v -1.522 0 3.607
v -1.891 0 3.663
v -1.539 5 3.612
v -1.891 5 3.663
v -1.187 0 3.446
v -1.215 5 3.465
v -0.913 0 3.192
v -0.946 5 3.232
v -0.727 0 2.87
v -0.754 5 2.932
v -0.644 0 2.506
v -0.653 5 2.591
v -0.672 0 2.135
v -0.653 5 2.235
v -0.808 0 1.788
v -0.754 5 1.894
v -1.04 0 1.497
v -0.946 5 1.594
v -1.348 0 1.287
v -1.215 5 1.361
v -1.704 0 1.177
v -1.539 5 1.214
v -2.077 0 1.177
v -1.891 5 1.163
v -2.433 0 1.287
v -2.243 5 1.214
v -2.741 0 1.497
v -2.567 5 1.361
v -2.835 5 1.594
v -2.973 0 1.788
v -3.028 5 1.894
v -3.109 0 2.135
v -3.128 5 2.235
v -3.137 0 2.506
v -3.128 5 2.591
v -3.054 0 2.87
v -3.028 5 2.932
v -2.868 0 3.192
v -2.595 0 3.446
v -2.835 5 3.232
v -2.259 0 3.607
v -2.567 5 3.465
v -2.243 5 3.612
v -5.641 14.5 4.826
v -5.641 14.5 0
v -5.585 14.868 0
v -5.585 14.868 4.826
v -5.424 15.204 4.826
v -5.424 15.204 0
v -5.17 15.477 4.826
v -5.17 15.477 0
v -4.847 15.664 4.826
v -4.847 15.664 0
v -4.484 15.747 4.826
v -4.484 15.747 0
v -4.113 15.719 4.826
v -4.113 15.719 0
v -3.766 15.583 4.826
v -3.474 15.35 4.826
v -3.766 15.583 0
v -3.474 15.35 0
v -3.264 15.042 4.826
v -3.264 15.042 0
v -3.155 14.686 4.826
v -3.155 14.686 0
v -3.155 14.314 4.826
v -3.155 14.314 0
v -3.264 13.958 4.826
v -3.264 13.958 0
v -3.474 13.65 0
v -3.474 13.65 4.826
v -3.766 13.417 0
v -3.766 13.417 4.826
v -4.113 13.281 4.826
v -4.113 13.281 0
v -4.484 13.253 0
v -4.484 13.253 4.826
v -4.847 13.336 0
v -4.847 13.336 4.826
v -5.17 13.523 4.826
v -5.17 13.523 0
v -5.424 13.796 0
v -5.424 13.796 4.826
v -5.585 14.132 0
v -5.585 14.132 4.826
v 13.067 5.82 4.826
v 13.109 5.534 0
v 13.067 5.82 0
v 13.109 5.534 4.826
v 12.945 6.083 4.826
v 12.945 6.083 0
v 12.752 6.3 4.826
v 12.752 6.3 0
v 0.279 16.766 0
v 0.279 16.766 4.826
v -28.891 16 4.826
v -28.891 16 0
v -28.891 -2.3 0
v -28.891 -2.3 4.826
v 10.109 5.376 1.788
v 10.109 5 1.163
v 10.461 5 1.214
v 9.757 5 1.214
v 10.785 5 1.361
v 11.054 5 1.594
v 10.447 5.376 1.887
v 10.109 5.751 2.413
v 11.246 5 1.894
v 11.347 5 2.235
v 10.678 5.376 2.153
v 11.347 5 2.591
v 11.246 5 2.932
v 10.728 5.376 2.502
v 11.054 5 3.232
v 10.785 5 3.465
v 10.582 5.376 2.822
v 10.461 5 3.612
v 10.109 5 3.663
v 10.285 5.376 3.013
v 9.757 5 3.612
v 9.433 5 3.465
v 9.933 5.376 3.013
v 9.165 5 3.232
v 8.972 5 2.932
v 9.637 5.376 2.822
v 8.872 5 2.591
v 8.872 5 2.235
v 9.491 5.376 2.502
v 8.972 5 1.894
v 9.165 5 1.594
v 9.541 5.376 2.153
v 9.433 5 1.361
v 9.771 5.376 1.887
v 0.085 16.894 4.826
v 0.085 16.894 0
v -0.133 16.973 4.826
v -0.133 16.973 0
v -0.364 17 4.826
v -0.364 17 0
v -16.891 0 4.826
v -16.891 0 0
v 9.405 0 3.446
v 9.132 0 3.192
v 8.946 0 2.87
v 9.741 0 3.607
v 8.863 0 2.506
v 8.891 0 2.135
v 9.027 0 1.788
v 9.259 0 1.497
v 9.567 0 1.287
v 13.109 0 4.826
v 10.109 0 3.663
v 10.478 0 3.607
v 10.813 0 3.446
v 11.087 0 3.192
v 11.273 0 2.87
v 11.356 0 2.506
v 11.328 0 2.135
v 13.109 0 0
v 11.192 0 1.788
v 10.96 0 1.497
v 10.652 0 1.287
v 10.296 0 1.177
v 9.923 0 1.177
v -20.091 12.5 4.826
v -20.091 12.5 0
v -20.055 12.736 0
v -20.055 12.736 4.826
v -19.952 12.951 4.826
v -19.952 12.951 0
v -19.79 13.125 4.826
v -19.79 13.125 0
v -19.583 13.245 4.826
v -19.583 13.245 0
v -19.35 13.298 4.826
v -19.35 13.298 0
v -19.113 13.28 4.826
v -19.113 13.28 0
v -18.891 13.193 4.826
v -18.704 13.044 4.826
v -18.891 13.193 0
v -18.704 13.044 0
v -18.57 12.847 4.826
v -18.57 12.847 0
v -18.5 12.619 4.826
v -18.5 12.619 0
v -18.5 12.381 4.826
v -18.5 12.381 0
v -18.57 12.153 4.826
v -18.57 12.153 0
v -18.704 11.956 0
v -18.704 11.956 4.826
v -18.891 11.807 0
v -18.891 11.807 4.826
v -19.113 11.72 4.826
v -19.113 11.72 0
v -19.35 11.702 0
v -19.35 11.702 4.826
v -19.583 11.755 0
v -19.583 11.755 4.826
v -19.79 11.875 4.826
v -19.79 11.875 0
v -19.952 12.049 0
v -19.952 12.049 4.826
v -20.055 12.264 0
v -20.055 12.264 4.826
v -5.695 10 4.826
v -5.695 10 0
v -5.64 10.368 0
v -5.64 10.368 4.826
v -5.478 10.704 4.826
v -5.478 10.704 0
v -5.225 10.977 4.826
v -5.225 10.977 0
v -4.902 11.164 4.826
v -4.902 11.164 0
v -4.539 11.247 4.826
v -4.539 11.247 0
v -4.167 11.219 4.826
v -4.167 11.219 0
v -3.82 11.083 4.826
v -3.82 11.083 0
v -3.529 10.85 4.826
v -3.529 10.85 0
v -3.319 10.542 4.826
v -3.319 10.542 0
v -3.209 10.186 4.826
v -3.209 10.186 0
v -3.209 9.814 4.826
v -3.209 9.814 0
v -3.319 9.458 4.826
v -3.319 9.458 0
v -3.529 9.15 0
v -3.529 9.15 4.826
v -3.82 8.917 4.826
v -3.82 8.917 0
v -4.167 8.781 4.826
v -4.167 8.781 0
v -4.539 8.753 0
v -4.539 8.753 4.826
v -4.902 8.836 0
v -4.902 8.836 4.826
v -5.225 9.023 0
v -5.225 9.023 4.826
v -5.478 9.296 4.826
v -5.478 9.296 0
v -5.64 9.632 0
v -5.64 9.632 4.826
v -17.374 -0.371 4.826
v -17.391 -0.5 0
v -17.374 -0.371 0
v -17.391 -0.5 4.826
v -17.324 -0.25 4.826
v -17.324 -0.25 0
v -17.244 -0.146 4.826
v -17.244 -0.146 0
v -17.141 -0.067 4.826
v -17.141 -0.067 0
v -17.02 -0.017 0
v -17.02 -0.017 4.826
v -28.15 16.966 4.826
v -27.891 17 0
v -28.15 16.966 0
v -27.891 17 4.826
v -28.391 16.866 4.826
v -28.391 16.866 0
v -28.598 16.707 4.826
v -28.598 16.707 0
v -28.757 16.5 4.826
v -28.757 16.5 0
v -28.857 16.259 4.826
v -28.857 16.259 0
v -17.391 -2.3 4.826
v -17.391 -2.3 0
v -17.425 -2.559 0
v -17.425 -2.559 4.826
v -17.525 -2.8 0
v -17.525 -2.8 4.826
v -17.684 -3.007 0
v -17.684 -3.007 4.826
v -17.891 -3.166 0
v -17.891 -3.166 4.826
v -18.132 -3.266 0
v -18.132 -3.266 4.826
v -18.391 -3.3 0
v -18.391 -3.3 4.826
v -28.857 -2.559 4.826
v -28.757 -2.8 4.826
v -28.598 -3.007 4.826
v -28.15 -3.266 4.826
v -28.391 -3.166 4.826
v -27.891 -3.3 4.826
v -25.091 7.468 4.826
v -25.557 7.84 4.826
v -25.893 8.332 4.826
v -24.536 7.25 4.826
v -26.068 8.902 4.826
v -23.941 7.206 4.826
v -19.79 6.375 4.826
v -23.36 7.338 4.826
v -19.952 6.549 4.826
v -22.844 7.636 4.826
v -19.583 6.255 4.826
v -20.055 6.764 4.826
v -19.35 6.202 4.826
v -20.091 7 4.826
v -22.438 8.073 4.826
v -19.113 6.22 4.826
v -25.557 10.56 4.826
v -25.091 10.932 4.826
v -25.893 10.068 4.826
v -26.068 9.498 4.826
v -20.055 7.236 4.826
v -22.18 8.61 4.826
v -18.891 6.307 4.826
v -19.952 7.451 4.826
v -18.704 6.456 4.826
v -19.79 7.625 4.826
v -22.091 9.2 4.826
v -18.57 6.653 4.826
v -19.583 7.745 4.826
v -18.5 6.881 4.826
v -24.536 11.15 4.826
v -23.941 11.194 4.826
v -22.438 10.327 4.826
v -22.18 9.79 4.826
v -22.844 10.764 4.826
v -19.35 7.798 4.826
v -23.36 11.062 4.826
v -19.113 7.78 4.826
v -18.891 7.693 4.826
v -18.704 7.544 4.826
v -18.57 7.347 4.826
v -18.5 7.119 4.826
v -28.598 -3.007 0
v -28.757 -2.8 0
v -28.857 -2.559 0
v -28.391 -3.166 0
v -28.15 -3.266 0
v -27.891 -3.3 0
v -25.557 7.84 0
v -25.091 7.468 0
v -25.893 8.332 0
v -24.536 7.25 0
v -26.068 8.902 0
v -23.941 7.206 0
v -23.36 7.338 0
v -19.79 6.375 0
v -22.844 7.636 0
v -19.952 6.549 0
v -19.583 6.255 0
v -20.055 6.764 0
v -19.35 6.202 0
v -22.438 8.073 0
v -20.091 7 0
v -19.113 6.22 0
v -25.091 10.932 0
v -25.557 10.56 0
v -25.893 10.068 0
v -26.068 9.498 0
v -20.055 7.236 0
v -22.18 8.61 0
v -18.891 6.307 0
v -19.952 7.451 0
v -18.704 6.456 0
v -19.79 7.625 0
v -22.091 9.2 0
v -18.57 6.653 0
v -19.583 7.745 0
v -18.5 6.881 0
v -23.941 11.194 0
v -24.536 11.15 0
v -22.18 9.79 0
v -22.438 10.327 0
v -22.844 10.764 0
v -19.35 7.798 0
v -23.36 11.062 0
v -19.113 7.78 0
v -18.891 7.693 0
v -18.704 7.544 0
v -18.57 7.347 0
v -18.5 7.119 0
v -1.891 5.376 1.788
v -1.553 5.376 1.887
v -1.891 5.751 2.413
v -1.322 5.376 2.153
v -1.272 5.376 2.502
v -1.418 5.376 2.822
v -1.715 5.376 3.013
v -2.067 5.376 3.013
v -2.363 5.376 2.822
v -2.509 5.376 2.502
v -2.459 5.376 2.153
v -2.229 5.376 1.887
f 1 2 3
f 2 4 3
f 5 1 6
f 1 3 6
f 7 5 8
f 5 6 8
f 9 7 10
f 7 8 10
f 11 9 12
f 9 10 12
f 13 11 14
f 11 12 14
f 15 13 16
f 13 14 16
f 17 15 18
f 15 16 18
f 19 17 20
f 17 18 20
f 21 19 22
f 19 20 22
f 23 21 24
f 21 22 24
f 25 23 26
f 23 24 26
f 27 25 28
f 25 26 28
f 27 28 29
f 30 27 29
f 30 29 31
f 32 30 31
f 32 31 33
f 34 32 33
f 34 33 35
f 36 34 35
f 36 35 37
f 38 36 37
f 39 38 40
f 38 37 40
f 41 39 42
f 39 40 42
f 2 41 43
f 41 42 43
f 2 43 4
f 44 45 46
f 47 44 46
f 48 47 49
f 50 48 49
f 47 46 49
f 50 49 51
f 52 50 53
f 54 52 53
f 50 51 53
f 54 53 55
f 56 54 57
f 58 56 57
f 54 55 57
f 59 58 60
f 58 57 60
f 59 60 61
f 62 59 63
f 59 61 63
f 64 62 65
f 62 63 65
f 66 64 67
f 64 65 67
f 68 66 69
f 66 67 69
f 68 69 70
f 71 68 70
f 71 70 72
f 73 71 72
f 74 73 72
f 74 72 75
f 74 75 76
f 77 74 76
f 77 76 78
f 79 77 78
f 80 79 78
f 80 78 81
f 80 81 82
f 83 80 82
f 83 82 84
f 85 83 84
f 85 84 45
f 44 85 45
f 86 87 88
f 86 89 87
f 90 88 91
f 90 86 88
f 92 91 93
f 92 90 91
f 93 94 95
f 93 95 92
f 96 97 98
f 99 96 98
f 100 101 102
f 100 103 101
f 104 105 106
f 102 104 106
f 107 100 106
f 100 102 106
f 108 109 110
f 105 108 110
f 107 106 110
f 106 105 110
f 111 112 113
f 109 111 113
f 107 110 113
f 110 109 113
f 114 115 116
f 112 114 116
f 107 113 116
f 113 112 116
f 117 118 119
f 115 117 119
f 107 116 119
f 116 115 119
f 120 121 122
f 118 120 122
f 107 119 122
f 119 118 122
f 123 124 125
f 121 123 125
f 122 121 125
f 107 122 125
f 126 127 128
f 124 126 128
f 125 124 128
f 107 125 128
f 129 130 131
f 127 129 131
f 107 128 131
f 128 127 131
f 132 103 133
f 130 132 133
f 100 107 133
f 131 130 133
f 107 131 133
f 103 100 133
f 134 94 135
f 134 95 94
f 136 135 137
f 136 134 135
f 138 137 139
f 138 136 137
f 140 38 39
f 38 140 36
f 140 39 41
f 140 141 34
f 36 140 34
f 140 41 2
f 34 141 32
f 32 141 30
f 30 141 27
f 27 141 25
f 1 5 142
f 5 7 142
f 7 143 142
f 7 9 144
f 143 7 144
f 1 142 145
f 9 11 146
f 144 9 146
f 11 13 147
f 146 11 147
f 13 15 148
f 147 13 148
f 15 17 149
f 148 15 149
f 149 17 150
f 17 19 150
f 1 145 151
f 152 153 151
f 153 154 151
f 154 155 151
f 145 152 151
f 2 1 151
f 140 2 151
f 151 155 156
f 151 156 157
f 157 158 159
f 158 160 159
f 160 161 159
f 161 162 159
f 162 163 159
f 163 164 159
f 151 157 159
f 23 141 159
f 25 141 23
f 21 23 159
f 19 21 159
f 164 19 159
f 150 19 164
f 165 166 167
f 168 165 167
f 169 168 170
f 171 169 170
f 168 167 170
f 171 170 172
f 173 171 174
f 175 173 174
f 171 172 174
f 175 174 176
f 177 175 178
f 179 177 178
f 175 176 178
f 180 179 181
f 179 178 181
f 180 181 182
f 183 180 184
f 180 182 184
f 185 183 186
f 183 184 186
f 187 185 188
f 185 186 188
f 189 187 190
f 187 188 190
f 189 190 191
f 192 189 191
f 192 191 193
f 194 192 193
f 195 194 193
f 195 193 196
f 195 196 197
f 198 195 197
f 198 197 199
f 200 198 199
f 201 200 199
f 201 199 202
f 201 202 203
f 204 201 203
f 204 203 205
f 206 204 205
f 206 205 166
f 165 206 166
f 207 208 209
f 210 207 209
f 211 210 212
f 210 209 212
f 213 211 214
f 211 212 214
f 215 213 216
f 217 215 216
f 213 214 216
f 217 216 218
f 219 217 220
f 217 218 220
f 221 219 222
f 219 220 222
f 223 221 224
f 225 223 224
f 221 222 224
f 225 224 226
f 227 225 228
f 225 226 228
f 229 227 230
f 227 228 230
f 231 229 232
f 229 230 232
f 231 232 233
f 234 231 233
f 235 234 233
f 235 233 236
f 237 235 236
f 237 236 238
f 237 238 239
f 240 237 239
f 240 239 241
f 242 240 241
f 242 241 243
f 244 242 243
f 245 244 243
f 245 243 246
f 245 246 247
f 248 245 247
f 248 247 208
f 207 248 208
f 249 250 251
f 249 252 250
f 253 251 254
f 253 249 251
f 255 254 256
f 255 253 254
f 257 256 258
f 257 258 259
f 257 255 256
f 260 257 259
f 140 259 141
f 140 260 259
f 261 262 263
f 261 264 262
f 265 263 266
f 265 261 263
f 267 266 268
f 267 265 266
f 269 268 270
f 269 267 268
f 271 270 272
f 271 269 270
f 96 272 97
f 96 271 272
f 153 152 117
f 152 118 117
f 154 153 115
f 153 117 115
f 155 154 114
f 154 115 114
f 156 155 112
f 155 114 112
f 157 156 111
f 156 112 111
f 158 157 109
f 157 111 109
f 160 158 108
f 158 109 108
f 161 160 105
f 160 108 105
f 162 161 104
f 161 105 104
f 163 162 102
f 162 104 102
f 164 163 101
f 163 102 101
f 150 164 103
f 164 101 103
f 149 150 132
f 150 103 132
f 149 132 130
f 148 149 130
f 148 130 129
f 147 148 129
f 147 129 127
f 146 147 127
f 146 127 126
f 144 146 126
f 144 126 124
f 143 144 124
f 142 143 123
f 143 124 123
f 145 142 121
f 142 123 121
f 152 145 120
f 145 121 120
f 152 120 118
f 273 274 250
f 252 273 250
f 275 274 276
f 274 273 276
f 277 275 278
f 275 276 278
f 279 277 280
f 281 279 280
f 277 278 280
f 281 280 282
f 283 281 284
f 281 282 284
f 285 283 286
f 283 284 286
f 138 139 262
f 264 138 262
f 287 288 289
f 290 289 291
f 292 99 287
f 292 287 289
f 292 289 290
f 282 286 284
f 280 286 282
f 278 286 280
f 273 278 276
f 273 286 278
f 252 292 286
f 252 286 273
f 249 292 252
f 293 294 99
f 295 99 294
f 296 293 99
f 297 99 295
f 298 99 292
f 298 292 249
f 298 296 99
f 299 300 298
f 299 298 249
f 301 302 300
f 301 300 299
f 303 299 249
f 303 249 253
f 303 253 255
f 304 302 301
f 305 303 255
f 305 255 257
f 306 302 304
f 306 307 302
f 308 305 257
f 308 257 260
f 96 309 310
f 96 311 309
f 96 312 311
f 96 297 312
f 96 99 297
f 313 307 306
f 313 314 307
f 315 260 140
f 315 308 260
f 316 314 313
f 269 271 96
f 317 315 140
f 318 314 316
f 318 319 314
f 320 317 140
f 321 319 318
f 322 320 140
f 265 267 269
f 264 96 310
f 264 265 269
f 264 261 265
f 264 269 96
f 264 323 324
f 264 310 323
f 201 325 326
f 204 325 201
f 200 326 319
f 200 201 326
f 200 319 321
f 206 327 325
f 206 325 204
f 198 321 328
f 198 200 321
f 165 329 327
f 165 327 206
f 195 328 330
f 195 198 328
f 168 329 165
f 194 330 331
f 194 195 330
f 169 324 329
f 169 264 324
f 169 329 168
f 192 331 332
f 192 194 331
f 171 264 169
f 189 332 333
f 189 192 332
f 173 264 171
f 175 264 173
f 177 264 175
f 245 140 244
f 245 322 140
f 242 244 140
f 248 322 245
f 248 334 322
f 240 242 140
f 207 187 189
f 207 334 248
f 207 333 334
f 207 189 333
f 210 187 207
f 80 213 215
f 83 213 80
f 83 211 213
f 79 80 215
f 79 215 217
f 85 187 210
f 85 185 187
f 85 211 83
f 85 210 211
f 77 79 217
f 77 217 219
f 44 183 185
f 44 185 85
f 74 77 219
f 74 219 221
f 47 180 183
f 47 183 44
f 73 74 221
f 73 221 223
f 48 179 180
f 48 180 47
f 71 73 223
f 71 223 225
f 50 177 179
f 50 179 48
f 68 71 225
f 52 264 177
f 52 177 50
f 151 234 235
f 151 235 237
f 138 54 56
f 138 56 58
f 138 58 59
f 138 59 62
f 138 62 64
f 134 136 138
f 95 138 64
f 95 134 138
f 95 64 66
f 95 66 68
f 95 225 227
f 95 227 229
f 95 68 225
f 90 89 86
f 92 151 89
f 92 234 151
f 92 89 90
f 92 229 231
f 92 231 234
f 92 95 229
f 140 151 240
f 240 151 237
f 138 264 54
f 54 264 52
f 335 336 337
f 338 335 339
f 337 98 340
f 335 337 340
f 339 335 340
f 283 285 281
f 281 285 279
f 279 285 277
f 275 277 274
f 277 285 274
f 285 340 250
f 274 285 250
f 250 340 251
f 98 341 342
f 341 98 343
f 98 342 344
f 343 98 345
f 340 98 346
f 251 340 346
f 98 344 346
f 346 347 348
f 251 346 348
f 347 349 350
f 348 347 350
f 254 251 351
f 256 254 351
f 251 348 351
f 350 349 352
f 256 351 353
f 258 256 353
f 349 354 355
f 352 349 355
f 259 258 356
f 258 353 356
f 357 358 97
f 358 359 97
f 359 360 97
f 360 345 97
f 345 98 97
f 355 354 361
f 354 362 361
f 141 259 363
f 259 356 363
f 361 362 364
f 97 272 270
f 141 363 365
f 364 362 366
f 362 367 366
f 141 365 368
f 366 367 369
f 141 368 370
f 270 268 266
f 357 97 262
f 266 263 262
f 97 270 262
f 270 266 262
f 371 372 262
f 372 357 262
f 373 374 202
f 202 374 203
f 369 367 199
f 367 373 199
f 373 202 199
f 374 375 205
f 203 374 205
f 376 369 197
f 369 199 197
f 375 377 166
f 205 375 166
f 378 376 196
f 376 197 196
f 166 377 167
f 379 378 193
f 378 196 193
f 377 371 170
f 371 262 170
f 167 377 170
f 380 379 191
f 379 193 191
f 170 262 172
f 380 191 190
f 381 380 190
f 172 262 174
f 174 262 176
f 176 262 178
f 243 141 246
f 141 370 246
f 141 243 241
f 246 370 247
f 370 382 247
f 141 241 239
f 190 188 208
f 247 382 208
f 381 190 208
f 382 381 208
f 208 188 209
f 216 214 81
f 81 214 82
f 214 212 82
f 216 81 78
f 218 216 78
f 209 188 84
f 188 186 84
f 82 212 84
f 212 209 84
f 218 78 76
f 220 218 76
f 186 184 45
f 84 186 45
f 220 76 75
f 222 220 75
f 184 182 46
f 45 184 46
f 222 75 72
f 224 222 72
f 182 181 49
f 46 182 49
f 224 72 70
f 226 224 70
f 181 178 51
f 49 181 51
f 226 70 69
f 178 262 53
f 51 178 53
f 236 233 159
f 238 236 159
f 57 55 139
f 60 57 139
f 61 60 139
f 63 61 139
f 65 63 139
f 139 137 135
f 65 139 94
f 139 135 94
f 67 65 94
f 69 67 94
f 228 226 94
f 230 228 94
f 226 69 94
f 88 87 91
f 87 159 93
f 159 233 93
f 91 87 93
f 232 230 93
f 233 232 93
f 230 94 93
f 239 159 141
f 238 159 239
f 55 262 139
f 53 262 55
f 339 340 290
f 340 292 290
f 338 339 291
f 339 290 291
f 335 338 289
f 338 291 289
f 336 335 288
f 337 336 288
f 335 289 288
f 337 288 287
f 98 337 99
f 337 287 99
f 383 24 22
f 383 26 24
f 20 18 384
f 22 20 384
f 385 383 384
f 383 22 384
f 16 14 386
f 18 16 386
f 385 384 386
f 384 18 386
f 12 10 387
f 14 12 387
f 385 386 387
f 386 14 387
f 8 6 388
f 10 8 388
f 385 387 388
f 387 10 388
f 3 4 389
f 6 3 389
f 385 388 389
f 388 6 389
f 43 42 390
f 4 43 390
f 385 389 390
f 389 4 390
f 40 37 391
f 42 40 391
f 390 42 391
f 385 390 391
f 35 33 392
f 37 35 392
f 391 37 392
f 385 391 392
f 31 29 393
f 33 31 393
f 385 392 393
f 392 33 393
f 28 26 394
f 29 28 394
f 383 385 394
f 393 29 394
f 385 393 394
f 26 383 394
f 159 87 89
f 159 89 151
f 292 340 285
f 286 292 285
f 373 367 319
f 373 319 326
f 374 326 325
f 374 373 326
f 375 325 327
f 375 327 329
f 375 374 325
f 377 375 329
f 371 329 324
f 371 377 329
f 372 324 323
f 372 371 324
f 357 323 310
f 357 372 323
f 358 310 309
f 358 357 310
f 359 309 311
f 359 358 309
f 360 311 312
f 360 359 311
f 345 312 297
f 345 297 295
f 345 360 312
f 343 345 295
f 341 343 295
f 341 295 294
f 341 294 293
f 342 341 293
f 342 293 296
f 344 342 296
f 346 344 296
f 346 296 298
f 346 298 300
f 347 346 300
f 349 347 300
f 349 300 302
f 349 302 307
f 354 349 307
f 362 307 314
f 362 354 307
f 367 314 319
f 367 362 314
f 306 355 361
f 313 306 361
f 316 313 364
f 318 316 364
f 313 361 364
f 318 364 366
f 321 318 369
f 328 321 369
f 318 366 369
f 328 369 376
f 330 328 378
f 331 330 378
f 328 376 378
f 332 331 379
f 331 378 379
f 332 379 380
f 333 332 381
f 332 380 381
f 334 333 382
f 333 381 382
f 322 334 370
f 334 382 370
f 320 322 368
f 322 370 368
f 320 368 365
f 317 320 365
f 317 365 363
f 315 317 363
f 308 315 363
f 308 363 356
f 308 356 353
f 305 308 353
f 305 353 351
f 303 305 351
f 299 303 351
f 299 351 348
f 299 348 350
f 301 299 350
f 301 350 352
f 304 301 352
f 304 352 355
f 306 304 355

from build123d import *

# Parameters (mm, degrees)
BOSS_EXTRUDE1_DEPTH             = 4.826
M3X0_5_TAPPED_HOLE1_D           = 2.5
TAP_DRILL_FOR_M3X0_5_TAP1_D     = 2.5
TAP_DRILL_FOR_M3X0_5_TAP1_DEPTH = 5
TAP_DRILL_FOR_M3X0_5_TAP1_TIP   = 0.751075774
SKETCH1_3_R                     = 2
BOSS_EXTRUDE2_DEPTH             = 4.826
M3X0_5_TAPPED_HOLE2_D           = 2.5
FILLET1_R                       = 1
M2_TAPPED_HOLES_D               = 1.6
FILLET2_R                       = 0.5


with BuildPart() as part:
    # Sketch1 → Boss-Extrude1 (new body)
    with BuildSketch(Plane.XY):
        Polygon((13.109289519, 0), (0, 0), (-8.890710481, 0), (-8.890710481, 17), (0, 17), (13.109289519, 6), align=None)
    extrude(amount=BOSS_EXTRUDE1_DEPTH)

    # M3x0.5 Tapped Hole1 (through all)
    with Locations(Plane.XY.offset(4.826)):
        with Locations((-4.445355241, 10)):
            Hole(M3X0_5_TAPPED_HOLE1_D / 2)

    # Tap Drill for M3x0.5 Tap1
    with Locations(Plane(origin=(-1.890710481, 0, 2.413), x_dir=(0, 0, -1), z_dir=(0, -1, 0))):
        with Locations((0, 0), (0, 12)):
            Hole(TAP_DRILL_FOR_M3X0_5_TAP1_D / 2, depth=TAP_DRILL_FOR_M3X0_5_TAP1_DEPTH)
            with Locations((0, 0, -(TAP_DRILL_FOR_M3X0_5_TAP1_DEPTH + TAP_DRILL_FOR_M3X0_5_TAP1_TIP / 2))):  # 118° drill point
                Cone(0, TAP_DRILL_FOR_M3X0_5_TAP1_D / 2, TAP_DRILL_FOR_M3X0_5_TAP1_TIP, mode=Mode.SUBTRACT)

    # Sketch1<3> → Boss-Extrude2 (add)
    with BuildSketch(Plane.XY):
        Polygon((-17.390710481, 0), (-8.890710481, 0), (-8.890710481, 17), (-17.390710481, 17), (-28.890710481, 17), (-28.890710481, -3.3), (-17.390710481, -3.3), align=None)
        with Locations((-24.090710481, 9.2)):
            Circle(SKETCH1_3_R, mode=Mode.SUBTRACT)
    extrude(amount=BOSS_EXTRUDE2_DEPTH)

    # M3x0.5 Tapped Hole2 (through all)
    with Locations(Plane.XY.offset(4.826)):
        with Locations((-4.390710481, 14.5)):
            Hole(M3X0_5_TAPPED_HOLE2_D / 2)

    # Fillet1
    fillet1_edges = [part.edges().sort_by_distance(p)[0] for p in [
        (0, 17, 2.413),
        (13.109289519, 6, 2.413),
        (-28.890710481, 17, 2.413),
        (-28.890710481, -3.3, 2.413),
        (-17.390710481, -3.3, 2.413),
    ]]
    fillet(fillet1_edges, radius=FILLET1_R)

    # M2 Tapped Holes (through all)
    with Locations(Plane.XY.offset(4.826)):
        with Locations((-19.290710481, 12.5), (-19.290710481, 7)):
            Hole(M2_TAPPED_HOLES_D / 2)

    # Fillet2
    fillet2_edges = [part.edges().sort_by_distance(p)[0] for p in [
        (-17.390710481, 0, 2.413),
    ]]
    fillet(fillet2_edges, radius=FILLET2_R)


solid = part.part
